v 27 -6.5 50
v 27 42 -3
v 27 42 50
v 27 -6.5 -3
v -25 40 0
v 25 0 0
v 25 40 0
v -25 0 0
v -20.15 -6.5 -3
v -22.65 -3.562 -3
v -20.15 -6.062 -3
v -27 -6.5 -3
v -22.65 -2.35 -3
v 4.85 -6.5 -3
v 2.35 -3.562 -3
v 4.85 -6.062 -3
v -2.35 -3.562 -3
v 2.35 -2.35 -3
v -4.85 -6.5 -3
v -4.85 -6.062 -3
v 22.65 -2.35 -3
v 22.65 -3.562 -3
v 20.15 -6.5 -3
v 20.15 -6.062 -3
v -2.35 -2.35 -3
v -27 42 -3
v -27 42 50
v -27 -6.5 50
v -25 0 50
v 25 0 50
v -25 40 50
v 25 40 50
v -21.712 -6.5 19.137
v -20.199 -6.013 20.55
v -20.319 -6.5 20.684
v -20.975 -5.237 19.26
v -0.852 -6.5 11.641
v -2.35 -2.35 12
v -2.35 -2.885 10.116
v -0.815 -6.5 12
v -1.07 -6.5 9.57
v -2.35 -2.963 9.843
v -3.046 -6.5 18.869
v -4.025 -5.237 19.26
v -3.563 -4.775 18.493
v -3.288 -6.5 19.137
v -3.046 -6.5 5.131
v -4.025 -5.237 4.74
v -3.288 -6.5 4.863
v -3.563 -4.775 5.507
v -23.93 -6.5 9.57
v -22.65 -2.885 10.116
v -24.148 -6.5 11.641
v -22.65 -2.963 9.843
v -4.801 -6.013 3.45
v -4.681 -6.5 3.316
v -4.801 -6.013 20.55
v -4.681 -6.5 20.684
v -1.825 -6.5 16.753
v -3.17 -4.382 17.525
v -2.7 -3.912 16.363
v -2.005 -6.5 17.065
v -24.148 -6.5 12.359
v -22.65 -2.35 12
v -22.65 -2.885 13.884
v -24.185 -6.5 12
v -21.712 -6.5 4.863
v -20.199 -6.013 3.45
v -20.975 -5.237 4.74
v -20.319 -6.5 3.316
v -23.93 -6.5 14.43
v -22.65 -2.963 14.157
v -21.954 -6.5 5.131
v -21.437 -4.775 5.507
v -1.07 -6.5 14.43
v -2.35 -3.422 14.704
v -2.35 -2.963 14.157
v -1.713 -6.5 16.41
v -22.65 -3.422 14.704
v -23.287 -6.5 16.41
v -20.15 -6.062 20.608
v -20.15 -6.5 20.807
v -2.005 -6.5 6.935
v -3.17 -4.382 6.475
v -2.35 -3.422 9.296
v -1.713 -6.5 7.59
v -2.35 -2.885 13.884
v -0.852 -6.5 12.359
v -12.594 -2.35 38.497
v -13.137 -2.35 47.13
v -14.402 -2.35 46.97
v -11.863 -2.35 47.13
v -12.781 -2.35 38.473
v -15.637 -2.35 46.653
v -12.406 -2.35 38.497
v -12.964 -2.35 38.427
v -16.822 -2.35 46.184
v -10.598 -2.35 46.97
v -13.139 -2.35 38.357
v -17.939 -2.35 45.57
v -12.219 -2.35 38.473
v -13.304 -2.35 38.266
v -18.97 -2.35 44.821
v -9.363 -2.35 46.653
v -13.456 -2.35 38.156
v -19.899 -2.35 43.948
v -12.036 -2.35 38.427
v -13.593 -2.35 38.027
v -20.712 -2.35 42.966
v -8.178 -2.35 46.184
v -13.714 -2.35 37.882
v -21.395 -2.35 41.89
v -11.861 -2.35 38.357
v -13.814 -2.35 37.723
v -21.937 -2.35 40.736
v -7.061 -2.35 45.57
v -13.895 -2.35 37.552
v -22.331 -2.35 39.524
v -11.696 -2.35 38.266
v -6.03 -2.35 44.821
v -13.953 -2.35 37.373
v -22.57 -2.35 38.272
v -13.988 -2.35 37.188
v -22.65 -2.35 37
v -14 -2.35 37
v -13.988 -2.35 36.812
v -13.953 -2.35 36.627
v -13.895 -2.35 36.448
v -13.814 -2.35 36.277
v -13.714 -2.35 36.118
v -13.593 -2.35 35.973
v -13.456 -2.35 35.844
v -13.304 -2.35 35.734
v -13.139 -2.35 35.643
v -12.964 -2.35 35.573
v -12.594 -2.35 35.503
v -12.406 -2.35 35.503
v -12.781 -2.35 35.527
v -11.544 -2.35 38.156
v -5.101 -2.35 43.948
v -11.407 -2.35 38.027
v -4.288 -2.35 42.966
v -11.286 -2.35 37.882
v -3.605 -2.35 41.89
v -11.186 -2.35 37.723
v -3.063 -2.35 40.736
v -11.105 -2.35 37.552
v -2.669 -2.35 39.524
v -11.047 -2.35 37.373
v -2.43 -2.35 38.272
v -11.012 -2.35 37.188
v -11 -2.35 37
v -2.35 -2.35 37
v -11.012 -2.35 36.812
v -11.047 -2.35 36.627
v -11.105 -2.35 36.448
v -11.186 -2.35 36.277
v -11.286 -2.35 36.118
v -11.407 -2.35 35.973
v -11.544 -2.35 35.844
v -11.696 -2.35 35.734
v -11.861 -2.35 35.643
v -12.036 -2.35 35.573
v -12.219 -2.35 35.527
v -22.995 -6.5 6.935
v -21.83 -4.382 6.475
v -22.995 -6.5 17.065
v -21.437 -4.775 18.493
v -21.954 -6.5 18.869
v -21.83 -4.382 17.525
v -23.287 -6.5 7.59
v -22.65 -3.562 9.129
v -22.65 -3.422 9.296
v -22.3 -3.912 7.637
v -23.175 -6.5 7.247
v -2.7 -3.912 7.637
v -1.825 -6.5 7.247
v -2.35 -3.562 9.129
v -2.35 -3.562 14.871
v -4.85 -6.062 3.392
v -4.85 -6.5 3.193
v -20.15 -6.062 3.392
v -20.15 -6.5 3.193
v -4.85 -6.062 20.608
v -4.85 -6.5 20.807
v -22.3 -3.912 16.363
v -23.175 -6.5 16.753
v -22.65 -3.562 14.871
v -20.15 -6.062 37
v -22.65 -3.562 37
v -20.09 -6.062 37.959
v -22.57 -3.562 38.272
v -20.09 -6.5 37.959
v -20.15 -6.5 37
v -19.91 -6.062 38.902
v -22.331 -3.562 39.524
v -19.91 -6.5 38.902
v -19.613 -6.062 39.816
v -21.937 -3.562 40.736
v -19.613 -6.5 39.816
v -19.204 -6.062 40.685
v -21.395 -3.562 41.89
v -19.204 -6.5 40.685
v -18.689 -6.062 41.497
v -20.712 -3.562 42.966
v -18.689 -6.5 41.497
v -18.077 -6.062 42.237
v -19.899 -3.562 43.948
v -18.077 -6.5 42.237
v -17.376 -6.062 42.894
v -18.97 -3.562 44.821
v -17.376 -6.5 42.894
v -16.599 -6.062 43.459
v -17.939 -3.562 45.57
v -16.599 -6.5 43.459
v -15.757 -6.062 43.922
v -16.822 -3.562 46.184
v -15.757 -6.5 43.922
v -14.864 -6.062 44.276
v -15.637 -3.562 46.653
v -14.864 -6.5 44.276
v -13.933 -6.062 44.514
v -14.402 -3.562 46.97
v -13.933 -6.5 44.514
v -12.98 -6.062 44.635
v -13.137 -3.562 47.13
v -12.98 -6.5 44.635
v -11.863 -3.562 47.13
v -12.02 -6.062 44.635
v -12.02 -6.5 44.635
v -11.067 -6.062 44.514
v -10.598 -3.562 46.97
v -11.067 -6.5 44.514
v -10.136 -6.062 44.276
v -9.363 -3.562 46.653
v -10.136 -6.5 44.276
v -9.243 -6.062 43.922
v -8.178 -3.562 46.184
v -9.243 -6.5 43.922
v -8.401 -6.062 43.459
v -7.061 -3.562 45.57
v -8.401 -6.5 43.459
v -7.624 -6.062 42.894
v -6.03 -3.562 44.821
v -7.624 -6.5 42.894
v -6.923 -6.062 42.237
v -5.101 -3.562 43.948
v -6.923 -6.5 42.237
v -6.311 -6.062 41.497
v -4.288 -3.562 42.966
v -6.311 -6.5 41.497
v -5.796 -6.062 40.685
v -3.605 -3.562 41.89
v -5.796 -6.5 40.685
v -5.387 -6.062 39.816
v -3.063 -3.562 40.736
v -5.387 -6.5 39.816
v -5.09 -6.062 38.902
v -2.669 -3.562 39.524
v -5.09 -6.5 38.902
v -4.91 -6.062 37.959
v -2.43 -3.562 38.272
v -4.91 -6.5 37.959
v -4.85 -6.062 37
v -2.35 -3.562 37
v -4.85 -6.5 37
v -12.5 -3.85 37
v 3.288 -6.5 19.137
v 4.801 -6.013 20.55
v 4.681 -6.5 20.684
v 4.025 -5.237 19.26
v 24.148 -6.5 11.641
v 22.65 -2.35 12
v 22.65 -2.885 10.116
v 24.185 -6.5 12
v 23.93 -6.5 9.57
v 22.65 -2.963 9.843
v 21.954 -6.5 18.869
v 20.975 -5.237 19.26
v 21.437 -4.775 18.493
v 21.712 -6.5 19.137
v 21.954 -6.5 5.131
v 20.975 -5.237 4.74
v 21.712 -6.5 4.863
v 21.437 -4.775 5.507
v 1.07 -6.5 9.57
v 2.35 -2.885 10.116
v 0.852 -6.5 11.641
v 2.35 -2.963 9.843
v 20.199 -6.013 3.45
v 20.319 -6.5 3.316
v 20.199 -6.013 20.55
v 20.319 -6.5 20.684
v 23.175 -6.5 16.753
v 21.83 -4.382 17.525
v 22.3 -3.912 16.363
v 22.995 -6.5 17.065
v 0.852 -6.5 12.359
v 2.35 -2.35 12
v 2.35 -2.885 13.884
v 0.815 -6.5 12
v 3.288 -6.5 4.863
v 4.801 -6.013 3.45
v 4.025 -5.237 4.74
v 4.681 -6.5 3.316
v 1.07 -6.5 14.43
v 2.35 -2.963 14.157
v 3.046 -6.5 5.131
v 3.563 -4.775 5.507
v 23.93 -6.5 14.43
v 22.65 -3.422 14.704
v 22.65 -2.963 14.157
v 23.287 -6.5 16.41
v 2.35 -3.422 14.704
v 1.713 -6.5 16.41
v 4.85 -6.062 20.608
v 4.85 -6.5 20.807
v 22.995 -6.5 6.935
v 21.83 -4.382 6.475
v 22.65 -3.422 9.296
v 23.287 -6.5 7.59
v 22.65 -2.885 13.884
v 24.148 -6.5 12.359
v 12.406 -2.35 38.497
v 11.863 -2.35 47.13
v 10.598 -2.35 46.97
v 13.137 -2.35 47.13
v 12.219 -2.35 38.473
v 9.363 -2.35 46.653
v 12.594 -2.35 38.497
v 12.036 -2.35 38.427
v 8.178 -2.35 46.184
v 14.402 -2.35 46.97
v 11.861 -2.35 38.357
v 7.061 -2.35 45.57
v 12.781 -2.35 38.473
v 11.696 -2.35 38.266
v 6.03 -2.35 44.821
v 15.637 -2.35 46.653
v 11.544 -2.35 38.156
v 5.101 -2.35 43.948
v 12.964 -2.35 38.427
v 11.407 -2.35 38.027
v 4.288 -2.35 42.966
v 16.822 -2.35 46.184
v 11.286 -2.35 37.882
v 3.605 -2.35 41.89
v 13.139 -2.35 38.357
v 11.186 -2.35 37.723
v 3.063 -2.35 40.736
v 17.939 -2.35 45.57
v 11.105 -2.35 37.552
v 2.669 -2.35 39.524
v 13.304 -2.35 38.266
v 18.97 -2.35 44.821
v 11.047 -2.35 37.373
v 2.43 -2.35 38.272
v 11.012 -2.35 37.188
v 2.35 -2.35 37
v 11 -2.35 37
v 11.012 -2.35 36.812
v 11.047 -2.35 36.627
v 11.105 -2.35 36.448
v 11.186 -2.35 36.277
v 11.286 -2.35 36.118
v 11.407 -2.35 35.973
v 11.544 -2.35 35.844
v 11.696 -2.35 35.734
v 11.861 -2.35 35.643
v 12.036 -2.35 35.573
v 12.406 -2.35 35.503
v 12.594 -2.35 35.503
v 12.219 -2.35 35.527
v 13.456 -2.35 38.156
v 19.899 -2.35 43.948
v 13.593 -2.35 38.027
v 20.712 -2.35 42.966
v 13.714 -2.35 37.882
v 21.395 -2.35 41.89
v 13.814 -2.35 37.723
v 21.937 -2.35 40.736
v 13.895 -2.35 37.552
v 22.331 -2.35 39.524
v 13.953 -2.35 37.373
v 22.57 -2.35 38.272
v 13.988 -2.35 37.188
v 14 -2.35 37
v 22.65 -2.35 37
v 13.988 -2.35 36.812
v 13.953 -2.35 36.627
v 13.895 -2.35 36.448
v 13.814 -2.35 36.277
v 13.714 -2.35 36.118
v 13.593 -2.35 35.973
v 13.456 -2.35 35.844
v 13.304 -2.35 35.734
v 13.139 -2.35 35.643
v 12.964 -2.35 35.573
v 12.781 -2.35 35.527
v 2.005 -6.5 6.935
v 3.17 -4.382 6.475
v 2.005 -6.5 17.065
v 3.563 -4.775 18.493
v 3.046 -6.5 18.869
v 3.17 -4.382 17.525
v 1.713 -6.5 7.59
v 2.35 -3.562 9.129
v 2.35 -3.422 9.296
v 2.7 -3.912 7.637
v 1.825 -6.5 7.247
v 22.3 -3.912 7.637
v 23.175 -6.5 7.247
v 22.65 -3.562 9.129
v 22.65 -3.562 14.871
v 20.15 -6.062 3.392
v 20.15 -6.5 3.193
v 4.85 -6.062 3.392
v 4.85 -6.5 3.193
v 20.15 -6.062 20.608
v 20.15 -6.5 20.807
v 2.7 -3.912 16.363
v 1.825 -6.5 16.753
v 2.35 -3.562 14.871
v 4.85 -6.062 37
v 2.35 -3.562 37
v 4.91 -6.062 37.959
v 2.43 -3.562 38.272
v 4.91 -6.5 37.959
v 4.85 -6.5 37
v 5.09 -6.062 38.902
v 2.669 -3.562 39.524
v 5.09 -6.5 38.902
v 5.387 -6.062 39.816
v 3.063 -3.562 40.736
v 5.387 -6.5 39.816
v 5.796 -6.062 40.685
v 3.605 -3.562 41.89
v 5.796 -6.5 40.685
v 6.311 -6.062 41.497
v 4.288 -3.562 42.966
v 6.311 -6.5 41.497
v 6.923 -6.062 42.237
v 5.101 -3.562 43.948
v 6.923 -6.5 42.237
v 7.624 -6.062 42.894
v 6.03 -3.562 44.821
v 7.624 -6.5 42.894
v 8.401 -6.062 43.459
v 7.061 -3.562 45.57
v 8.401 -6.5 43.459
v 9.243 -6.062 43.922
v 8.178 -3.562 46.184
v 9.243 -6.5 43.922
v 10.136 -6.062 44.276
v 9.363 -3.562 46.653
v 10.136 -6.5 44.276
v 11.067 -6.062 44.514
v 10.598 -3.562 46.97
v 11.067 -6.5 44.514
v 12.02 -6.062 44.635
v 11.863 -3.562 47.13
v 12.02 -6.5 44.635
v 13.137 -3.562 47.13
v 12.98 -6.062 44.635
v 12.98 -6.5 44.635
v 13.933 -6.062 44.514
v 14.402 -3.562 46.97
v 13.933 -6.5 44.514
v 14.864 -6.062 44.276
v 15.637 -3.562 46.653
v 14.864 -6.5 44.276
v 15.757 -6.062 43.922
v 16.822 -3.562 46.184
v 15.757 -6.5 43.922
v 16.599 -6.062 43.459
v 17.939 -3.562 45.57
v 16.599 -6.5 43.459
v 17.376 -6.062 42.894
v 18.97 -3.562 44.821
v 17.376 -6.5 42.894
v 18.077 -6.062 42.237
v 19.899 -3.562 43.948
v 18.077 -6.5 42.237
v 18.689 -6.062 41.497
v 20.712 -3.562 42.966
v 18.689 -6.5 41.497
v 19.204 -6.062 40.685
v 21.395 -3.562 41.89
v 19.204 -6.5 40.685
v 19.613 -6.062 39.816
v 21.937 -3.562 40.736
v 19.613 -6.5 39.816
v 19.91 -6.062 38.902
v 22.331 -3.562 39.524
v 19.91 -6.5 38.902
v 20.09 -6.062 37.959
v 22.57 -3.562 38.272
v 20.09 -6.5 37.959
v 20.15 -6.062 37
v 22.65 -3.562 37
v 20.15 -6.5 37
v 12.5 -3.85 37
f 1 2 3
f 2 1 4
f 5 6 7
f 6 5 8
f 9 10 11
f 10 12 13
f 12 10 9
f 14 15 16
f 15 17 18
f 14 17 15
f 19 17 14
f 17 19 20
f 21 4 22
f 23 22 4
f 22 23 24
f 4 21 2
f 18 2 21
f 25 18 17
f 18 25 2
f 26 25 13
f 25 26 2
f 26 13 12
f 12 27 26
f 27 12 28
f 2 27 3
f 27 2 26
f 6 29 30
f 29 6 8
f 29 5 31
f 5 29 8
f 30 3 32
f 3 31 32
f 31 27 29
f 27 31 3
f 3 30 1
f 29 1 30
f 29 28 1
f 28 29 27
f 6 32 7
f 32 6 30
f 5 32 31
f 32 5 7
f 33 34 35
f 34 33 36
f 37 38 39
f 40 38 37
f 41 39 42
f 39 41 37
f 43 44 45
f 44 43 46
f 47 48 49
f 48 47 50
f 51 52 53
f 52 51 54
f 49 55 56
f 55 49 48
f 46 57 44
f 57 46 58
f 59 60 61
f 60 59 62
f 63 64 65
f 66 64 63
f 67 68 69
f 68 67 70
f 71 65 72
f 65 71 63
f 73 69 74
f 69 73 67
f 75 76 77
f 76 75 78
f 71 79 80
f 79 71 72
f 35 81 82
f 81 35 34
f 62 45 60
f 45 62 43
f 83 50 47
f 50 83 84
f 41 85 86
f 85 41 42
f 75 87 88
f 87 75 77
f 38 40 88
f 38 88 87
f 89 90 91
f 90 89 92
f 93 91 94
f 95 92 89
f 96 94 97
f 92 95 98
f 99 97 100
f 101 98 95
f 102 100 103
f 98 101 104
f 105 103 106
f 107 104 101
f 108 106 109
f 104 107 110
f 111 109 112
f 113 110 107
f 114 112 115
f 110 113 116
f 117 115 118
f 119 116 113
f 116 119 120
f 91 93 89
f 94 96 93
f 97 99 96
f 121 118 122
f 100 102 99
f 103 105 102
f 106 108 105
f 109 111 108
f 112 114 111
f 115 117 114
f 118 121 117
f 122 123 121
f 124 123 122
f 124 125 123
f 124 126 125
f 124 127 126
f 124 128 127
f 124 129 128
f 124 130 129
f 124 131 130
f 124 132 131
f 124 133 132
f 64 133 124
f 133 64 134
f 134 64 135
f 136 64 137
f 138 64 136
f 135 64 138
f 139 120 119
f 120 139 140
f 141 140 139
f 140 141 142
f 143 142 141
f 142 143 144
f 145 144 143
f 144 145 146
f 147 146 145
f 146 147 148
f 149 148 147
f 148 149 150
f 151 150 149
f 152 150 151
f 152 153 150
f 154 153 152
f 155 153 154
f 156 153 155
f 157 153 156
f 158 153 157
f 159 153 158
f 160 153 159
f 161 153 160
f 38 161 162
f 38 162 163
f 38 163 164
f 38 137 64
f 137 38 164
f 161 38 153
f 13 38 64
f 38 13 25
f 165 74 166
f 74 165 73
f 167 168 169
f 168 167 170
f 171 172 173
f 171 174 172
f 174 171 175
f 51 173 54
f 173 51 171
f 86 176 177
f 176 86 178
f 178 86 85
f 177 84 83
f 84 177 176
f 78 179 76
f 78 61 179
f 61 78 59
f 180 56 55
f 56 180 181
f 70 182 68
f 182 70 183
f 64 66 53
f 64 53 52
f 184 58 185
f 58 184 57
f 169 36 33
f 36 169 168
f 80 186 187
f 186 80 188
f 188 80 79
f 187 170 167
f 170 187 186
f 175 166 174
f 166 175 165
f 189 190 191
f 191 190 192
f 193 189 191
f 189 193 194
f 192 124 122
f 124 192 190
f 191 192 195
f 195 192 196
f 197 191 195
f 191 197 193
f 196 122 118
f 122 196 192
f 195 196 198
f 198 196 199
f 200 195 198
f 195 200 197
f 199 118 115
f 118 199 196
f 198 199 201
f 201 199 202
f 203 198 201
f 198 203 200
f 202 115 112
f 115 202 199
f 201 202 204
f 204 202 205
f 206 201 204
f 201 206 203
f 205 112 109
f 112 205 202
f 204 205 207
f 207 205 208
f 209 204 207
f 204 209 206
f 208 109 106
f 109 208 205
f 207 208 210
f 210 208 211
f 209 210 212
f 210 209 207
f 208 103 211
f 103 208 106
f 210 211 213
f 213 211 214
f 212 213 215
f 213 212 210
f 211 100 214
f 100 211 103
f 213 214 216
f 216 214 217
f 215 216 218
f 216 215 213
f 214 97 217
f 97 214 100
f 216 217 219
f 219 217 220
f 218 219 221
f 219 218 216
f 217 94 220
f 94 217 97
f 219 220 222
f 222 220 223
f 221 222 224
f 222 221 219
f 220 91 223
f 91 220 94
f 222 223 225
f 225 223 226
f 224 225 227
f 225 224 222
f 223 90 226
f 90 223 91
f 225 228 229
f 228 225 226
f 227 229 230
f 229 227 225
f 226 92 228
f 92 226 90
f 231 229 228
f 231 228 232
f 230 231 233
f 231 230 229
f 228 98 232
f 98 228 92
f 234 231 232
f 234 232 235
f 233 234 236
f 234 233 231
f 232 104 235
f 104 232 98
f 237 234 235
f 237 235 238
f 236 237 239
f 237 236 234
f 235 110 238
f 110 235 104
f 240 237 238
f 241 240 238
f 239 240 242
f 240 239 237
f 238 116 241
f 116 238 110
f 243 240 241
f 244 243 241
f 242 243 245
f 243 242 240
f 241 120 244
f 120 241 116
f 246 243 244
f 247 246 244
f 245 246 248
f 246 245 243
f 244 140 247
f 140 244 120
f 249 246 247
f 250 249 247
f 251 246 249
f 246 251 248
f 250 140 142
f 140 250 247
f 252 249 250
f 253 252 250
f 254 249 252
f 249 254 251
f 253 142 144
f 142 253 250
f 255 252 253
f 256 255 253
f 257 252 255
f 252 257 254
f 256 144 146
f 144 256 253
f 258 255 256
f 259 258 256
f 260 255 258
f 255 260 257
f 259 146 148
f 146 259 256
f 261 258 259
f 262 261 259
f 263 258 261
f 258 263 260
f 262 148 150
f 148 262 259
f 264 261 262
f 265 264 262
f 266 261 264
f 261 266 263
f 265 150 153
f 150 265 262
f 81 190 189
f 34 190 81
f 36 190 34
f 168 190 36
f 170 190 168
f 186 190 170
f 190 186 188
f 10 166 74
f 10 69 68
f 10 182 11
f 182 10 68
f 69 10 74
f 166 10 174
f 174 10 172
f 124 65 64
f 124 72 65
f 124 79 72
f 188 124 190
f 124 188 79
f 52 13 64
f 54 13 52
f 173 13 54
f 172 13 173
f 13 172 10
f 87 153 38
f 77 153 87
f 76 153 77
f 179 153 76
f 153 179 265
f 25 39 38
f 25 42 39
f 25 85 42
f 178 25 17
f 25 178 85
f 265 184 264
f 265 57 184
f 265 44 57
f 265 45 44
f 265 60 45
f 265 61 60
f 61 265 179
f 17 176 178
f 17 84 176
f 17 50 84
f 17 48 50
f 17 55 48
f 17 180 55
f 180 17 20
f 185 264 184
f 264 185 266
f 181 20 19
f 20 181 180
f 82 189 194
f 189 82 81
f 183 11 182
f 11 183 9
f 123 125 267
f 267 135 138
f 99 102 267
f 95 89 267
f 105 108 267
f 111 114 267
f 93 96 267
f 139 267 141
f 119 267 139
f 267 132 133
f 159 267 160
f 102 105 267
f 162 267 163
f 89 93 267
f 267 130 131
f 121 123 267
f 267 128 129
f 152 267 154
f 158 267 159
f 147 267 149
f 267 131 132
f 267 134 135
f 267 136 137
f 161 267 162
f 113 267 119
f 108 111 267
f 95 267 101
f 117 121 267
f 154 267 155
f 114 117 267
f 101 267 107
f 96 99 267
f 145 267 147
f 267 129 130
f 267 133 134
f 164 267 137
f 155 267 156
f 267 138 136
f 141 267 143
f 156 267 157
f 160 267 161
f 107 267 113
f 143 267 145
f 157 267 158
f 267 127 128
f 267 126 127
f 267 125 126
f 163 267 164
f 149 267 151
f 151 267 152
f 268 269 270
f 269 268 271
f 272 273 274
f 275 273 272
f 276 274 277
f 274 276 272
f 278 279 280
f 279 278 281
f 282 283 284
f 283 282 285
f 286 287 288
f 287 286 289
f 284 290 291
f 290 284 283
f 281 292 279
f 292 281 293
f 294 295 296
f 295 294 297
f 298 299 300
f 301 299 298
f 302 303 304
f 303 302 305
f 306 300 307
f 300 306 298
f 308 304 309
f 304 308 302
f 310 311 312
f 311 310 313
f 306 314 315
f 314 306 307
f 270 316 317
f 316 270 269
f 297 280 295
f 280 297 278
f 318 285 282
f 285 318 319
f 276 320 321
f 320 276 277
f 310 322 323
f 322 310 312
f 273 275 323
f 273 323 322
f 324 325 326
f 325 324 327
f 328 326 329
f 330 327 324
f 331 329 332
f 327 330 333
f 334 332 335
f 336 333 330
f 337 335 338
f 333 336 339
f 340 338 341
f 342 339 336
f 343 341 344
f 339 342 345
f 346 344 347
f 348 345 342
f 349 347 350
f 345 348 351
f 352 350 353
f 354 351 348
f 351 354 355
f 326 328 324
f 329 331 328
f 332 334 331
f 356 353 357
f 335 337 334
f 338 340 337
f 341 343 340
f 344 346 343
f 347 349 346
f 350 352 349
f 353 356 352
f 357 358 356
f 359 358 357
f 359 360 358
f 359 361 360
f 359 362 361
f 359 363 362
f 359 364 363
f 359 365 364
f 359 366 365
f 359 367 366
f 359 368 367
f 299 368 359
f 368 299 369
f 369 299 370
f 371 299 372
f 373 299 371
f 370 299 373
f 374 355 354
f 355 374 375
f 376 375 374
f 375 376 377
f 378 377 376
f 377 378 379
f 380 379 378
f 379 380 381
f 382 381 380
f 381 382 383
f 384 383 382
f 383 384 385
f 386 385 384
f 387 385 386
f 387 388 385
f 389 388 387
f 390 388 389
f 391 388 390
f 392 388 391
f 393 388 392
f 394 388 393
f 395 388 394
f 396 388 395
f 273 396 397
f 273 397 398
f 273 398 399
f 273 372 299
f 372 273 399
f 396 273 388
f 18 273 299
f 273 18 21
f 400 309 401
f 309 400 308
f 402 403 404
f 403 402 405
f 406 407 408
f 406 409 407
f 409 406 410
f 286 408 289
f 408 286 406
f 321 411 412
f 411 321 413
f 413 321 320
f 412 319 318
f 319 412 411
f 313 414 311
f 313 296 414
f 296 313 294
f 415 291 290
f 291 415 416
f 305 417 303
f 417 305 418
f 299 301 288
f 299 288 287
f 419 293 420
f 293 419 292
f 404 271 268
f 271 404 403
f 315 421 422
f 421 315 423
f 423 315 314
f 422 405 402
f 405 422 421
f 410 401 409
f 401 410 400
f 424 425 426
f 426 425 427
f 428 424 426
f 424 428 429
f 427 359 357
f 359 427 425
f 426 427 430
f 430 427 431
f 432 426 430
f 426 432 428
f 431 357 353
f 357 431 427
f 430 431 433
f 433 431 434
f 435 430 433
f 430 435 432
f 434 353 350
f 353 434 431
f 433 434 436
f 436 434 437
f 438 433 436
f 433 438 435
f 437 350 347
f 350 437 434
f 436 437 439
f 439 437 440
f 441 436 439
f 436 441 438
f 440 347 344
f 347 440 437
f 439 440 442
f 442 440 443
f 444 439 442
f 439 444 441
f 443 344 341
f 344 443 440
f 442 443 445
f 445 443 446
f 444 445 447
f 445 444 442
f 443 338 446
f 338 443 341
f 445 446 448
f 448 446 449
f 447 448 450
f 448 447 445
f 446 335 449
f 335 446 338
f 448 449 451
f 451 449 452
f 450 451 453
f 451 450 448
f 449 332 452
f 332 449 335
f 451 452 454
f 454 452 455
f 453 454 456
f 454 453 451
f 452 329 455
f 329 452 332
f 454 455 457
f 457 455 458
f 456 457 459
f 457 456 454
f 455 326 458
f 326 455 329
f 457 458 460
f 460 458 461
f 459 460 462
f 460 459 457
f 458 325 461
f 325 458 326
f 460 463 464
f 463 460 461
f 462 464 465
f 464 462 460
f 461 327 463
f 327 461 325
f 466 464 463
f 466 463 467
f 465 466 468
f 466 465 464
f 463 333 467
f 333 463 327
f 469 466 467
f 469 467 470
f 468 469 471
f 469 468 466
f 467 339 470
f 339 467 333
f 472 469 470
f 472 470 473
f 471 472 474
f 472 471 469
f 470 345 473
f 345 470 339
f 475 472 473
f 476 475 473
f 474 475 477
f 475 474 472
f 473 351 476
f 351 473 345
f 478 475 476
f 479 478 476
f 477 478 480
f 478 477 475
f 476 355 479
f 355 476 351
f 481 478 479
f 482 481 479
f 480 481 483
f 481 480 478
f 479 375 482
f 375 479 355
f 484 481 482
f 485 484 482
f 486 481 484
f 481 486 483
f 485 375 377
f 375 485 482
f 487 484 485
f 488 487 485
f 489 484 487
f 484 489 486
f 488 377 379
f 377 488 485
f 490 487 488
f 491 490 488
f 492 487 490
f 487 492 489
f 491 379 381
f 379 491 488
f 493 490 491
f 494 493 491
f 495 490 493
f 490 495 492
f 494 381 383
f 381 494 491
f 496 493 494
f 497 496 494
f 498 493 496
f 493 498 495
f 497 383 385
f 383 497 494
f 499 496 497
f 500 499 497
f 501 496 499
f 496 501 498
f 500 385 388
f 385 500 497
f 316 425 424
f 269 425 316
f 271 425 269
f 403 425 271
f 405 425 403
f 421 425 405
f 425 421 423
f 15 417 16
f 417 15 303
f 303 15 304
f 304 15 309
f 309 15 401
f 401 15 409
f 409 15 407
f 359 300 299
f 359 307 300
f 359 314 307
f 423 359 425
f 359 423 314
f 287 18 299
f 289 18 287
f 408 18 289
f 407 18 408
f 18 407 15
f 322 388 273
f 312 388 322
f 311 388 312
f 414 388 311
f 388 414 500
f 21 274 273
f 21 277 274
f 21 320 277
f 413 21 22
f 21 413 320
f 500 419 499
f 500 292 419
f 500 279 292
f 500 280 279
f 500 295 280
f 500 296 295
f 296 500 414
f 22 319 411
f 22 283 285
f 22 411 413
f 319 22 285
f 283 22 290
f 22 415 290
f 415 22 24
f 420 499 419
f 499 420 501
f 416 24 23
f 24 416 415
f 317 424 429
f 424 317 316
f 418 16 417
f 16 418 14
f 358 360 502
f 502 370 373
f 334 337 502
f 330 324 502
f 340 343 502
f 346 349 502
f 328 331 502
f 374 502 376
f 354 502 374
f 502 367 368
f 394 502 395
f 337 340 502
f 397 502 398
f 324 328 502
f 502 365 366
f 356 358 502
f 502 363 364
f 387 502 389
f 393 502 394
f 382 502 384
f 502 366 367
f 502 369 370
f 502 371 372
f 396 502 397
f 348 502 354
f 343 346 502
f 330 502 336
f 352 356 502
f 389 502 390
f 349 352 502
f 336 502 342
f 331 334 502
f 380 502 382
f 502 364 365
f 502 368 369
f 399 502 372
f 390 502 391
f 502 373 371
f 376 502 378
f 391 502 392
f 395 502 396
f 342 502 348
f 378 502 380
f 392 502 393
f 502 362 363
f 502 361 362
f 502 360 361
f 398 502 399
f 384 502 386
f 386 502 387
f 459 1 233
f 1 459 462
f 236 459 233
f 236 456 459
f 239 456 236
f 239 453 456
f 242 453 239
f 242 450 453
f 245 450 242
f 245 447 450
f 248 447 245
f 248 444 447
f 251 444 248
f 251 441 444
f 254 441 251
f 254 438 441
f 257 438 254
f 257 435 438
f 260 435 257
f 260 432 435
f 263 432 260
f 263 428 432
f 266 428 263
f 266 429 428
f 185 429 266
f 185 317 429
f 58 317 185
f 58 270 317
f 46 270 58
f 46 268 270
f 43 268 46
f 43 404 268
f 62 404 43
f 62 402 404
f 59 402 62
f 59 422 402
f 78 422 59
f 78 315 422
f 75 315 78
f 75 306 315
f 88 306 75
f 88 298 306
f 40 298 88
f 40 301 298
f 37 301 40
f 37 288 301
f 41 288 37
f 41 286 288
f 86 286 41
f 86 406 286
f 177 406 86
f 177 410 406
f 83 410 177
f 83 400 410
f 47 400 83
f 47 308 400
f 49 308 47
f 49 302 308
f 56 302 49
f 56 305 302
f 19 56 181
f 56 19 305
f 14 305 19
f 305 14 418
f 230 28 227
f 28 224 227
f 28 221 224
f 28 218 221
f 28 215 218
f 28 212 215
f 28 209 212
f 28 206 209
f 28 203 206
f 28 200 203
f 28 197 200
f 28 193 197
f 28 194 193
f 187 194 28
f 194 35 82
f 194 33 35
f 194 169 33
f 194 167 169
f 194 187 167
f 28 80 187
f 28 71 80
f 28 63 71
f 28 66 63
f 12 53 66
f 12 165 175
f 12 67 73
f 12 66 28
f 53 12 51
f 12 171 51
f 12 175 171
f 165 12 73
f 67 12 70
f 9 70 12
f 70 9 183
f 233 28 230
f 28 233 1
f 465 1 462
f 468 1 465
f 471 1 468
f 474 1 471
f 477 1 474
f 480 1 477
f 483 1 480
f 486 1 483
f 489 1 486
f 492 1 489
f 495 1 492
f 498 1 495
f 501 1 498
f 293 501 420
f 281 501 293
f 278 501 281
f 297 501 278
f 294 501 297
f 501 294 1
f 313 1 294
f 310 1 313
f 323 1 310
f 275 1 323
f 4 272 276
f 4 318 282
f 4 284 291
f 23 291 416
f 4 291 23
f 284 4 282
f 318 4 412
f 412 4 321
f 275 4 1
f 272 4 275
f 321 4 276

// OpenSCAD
/*Created by Andy Levesque
Credit to @David D on Printables and Jonathan at Keep Making for Multiconnect and Multiboard, respectively
Licensed Creative Commons 4.0 Attribution Non-Commercial Sharable with Attribution
*/

/* [Internal Dimensions] */
//Height (in mm) from the top of the back to the base of the internal floor
internalHeight = 50.0; //.1
//Width (in mm) of the internal dimension or item you wish to hold
internalWidth = 50.0; //.1
//Length (i.e., distance from back) (in mm) of the internal dimension or item you wish to hold
internalDepth = 40.0; //.1

/* [Additional Customization] */
//Thickness of bin walls (in mm)
wallThickness = 2; //.1
//Thickness of bin  (in mm)
baseThickness = 3; //.1

/*[Slot Customization]*/
//Distance between Multiconnect slots on the back (25mm is standard for MultiBoard)
distanceBetweenSlots = 25;
//QuickRelease removes the small indent in the top of the slots that lock the part into place
slotQuickRelease = false;
//Dimple scale tweaks the size of the dimple in the slot for printers that need a larger dimple to print correctly
dimpleScale = 1; //[0.5:.05:1.5]
//Scale the size of slots in the back (1.015 scale is default for a tight fit. Increase if your finding poor fit. )
slotTolerance = 1.00; //[0.925:0.005:1.075]
//Move the slot in (positive) or out (negative)
slotDepthMicroadjustment = 0; //[-.5:0.05:.5]
//enable a slot on-ramp for easy mounting of tall items
onRampEnabled = true;
//frequency of slots for on-ramp. 1 = every slot; 2 = every 2 slots; etc.
onRampEveryXSlots = 1;


/* [Hidden] */

//Calculated
totalWidth = internalWidth + wallThickness*2;
totalHeight = internalHeight + baseThickness;

//move to center
translate(v = [-internalWidth/2,0,0])
    basket();
translate(v = [-max(totalWidth,distanceBetweenSlots)/2,0,-baseThickness]) 
    multiconnectBack(backWidth = totalWidth, backHeight = totalHeight, distanceBetweenSlots = distanceBetweenSlots);

//Create Basket
module basket() {
    union() {
        //bottom
        translate([-wallThickness,0,-baseThickness])
            cube([internalWidth + wallThickness*2, internalDepth + wallThickness,baseThickness]);

        //left wall
        translate([-wallThickness,0,0])
            cube([wallThickness, internalDepth + wallThickness, internalHeight]);

        //right wall
        translate([internalWidth,0,0])
            cube([wallThickness, internalDepth + wallThickness, internalHeight]);

        difference() {
        //frontCapture
            translate([0,internalDepth,0])
                cube([internalWidth,wallThickness,internalHeight]);
        }
    }
            
}

//BEGIN MODULES
//Slotted back Module
module multiconnectBack(backWidth, backHeight, distanceBetweenSlots)
{
    //slot count calculates how many slots can fit on the back. Based on internal width for buffer. 
    //slot width needs to be at least the distance between slot for at least 1 slot to generate
    let (backWidth = max(backWidth,distanceBetweenSlots), backHeight = max(backHeight, 25),slotCount = floor(backWidth/distanceBetweenSlots), backThickness = 6.5){
        difference() {
            translate(v = [0,-backThickness,0]) cube(size = [backWidth,backThickness,backHeight]);
            //Loop through slots and center on the item
            //Note: I kept doing math until it looked right. It's possible this can be simplified.
            for (slotNum = [0:1:slotCount-1]) {
                translate(v = [distanceBetweenSlots/2+(backWidth/distanceBetweenSlots-slotCount)*distanceBetweenSlots/2+slotNum*distanceBetweenSlots,-2.35+slotDepthMicroadjustment,backHeight-13]) {
                    slotTool(backHeight);
                }
            }
        }
    }
    //Create Slot Tool
    module slotTool(totalHeight) {
        scale(v = slotTolerance)
        //slot minus optional dimple with optional on-ramp
        let (slotProfile = [[0,0],[10.15,0],[10.15,1.2121],[7.65,3.712],[7.65,5],[0,5]])
        difference() {
            union() {
                //round top
                rotate(a = [90,0,0,]) 
                    rotate_extrude($fn=50) 
                        polygon(points = slotProfile);
                //long slot
                translate(v = [0,0,0]) 
                    rotate(a = [180,0,0]) 
                    linear_extrude(height = totalHeight+1) 
                        union(){
                            polygon(points = slotProfile);
                            mirror([1,0,0])
                                polygon(points = slotProfile);
                        }
                //on-ramp
                if(onRampEnabled)
                    for(y = [1:onRampEveryXSlots:totalHeight/distanceBetweenSlots])
                        translate(v = [0,-5,-y*distanceBetweenSlots]) 
                            rotate(a = [-90,0,0]) 
                                 cylinder(h = 5, r1 = 12, r2 = 10.15);
            }
            //dimple
            if (slotQuickRelease == false)
                scale(v = dimpleScale) 
                rotate(a = [90,0,0,]) 
                    rotate_extrude($fn=50) 
                        polygon(points = [[0,0],[0,1.5],[1.5,0]]);
        }
    }
}
